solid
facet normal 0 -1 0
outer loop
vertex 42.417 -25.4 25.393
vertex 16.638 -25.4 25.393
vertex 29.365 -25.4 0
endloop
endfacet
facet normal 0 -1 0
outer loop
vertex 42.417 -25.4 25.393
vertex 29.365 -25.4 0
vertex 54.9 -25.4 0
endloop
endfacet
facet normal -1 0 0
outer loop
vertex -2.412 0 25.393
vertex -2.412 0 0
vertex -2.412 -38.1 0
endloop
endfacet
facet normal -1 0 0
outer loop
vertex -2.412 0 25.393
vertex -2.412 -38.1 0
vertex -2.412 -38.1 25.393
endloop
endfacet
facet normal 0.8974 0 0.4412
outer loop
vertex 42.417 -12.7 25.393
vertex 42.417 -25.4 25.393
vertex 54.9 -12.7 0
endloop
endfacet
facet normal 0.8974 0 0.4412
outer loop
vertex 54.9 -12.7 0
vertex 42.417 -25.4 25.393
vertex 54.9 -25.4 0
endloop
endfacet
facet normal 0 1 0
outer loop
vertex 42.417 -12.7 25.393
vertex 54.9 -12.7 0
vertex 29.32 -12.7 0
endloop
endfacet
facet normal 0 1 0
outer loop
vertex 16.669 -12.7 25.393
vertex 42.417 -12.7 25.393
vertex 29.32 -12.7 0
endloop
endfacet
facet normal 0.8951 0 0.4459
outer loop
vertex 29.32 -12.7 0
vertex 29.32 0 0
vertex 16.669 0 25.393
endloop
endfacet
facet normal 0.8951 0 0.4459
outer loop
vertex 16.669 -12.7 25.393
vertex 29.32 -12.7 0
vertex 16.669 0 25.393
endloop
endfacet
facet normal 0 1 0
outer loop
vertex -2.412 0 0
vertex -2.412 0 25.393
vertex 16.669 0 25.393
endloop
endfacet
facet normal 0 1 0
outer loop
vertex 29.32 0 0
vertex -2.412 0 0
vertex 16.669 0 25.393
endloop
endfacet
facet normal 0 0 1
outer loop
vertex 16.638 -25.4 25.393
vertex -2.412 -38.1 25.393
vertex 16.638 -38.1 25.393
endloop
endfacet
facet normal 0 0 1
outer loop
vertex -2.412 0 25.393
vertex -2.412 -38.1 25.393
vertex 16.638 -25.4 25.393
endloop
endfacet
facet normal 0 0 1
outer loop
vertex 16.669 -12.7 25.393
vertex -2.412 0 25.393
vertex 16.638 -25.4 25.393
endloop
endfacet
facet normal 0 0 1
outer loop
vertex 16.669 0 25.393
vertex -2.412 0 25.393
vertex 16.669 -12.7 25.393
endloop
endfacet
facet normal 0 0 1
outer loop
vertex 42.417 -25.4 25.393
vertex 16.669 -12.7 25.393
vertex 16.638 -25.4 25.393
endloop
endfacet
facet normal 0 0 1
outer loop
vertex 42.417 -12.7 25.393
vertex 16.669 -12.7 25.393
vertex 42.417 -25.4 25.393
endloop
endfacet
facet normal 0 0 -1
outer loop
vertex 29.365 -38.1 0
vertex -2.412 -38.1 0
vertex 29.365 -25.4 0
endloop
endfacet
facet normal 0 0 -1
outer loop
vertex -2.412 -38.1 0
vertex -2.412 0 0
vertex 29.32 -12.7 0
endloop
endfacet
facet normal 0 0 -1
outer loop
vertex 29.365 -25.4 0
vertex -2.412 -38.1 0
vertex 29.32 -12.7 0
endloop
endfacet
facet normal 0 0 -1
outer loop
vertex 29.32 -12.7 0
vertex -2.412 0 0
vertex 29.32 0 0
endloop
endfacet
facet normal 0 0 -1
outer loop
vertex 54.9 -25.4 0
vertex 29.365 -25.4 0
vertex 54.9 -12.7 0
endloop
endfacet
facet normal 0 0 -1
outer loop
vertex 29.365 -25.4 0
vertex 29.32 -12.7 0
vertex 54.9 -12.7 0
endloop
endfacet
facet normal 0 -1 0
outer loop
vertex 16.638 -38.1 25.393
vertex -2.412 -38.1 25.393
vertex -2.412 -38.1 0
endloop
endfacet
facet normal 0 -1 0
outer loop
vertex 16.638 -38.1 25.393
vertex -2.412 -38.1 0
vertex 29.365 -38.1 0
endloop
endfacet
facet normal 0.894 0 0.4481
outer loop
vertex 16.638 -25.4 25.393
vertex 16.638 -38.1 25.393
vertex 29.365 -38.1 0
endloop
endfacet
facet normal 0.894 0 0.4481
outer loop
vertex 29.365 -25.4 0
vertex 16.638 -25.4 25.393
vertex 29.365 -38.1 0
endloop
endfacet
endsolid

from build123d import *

# Parameters (mm, degrees)
F0_W     = 57.3121234775
F0_H     = 25.3932457417
F1_DEPTH = 38.1
F3_DEPTH = 12.7
F5_DEPTH = 12.7
F7_DEPTH = 12.7


with BuildPart() as f1:
    # F0 (on Front) → F1 (new body)
    with BuildSketch(Plane.XZ):
        with Locations((26.2444131076, 12.6966228709)):
            Rectangle(F0_W, F0_H)
    extrude(amount=F1_DEPTH)

    # F2 (on face) → F3 (cut)
    with BuildSketch(Plane.XZ.offset(38.1)):
        Polygon((54.9004748464, 25.3932457417), (16.6383513689, 25.3932457417), (29.3653700501, 0), (54.9004748464, 0), align=None)
    extrude(amount=-F3_DEPTH, mode=Mode.SUBTRACT)

    # F4 (on face) → F5 (cut)
    with BuildSketch(Plane.XZ.offset(25.4)):
        Polygon((54.9004748464, 0), (54.9004748464, 25.3932457417), (42.4166470766, 25.3932457417), align=None)
    extrude(amount=-F5_DEPTH, mode=Mode.SUBTRACT)

    # F6 (on face) → F7 (cut)
    with BuildSketch(Plane(origin=(0, 0, 0), x_dir=(-1, 0, 0), z_dir=(0, 1, 0))):
        Polygon((-29.3199047446, 0), (-16.6687499732, 25.3932457417), (-54.9004748464, 25.3932457417), (-54.9004748464, 0), (-42.1420186758, 0), align=None)
    extrude(amount=-F7_DEPTH, mode=Mode.SUBTRACT)


solid = f1.part
